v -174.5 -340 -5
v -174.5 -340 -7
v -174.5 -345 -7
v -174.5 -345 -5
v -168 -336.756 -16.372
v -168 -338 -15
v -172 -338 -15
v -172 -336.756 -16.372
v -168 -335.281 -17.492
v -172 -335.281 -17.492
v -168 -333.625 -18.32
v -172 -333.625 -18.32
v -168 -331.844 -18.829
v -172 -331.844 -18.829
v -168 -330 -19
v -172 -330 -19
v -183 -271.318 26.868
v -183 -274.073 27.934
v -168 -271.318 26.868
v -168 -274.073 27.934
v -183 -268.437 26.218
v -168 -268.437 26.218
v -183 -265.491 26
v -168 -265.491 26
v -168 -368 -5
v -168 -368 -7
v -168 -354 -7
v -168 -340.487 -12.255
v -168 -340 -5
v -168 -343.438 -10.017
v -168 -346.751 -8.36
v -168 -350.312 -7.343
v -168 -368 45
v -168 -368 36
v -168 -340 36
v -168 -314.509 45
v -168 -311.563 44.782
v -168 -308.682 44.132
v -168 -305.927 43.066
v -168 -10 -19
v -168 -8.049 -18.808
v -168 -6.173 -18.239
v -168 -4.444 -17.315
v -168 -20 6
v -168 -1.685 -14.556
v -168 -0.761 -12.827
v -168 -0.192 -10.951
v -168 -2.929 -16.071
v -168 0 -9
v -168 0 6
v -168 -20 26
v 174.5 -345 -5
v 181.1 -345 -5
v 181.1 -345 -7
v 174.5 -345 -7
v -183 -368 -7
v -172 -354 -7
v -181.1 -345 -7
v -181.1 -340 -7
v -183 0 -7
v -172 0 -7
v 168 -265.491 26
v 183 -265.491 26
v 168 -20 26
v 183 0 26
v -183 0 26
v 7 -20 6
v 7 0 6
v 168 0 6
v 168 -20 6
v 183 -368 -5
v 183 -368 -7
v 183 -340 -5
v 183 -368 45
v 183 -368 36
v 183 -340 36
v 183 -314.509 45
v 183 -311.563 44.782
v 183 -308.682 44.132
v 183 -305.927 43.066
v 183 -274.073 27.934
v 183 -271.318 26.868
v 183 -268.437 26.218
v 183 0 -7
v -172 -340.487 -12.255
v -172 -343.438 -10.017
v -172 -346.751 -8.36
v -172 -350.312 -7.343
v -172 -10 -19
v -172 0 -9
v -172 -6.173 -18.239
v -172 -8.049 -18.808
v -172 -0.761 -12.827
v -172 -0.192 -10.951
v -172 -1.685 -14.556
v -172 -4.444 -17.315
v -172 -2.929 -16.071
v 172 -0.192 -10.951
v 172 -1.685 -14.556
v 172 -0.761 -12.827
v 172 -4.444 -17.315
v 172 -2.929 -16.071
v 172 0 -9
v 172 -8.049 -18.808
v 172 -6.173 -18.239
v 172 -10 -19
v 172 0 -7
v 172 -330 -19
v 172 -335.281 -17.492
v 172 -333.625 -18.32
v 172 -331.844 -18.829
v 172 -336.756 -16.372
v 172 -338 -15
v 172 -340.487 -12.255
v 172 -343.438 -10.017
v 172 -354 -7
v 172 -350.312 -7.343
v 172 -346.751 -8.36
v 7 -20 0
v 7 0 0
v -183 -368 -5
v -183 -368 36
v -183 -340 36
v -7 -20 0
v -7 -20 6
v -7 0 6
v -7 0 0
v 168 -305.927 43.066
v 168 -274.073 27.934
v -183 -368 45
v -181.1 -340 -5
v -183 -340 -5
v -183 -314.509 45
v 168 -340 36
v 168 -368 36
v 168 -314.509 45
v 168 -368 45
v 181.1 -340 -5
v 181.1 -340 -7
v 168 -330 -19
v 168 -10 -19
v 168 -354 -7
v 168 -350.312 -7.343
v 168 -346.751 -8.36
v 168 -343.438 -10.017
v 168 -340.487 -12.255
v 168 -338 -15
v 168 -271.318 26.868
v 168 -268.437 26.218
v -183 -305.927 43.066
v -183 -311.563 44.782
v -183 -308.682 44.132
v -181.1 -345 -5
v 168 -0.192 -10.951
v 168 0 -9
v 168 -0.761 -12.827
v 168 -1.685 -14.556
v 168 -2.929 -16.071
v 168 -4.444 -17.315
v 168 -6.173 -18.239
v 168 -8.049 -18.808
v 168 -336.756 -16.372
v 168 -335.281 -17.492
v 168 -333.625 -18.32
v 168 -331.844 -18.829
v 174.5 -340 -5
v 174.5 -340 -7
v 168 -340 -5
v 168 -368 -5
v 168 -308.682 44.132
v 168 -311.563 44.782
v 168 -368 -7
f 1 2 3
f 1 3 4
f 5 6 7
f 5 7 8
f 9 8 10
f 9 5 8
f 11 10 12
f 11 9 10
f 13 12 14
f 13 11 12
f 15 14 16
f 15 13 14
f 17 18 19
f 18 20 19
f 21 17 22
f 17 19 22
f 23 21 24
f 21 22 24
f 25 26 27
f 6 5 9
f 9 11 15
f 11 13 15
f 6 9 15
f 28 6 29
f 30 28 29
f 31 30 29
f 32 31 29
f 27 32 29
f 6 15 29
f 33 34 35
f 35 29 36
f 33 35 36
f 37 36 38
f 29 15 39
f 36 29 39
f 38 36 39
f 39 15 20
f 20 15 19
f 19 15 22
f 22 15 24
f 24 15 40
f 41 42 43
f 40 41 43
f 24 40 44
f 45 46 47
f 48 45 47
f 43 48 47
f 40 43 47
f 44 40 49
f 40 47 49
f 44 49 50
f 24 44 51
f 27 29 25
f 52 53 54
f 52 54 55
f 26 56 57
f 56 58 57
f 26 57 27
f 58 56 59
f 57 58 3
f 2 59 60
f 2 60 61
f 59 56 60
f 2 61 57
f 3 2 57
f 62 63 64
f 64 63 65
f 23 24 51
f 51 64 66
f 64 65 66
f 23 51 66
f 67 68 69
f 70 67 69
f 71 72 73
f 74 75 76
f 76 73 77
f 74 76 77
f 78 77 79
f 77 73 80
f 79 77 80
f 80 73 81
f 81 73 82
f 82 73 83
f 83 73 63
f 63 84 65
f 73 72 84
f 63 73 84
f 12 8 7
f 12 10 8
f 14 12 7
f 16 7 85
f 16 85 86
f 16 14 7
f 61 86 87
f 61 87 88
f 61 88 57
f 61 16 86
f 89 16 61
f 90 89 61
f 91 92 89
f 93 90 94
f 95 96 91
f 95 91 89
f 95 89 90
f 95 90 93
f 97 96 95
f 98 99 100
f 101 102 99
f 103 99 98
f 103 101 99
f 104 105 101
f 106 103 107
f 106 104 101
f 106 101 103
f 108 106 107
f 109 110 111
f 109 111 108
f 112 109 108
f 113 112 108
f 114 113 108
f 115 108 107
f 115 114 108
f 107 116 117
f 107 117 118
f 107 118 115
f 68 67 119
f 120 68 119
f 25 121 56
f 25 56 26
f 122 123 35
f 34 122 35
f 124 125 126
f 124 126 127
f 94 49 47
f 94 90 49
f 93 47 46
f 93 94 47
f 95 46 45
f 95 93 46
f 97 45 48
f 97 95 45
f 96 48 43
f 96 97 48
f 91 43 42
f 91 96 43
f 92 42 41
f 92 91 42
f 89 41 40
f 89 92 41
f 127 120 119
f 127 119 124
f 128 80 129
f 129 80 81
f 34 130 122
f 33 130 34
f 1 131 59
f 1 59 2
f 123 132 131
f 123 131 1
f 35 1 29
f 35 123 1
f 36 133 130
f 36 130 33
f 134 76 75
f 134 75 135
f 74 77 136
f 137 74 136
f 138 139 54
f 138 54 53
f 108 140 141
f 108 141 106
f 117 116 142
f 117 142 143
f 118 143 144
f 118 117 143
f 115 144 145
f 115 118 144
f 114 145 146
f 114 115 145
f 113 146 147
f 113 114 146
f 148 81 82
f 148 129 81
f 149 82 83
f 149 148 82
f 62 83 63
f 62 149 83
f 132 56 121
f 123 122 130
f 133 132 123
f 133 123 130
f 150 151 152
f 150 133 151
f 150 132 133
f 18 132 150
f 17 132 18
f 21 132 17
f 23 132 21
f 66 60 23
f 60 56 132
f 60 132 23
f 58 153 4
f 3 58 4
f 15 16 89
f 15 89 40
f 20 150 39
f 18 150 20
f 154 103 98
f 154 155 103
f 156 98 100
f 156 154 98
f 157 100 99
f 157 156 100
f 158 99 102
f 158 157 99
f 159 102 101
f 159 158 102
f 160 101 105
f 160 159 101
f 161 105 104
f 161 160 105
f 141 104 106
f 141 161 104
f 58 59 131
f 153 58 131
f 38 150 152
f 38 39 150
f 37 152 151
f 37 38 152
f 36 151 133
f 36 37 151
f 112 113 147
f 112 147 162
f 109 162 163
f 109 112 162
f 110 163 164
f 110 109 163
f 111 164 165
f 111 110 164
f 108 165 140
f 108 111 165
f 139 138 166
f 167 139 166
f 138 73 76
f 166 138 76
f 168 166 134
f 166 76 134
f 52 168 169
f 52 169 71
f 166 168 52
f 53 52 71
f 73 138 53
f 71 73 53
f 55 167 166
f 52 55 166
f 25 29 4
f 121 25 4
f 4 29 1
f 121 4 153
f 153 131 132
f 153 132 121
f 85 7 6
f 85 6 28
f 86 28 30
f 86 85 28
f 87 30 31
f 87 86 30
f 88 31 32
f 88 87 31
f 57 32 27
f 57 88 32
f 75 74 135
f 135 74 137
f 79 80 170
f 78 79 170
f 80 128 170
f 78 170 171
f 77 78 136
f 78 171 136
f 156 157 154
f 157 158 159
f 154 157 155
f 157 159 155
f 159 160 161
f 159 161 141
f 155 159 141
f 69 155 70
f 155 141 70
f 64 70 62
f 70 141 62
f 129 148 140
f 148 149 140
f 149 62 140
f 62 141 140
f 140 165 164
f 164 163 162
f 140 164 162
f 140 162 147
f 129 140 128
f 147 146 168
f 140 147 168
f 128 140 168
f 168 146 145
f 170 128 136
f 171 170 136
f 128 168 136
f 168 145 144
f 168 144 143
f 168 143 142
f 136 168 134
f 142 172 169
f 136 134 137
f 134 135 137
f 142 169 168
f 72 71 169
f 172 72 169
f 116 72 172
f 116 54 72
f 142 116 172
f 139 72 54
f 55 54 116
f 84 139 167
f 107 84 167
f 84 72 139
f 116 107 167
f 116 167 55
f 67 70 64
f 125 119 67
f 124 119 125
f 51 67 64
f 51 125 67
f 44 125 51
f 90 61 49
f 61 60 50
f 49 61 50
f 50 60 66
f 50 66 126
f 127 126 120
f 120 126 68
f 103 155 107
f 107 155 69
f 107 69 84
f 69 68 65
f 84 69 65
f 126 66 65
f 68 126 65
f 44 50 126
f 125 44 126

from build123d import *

# Parameters (mm, degrees)
EXTRUDE_1_DEPTH        = 26
EXTRUDE_2_DEPTH        = 19
FILLET_1_R             = 10
SKETCH_5_W             = 161
SKETCH_5_H             = 6
CUT_EXTRUDE_1_DEPTH    = 52
SKETCH_1_5_W           = 11
SKETCH_1_5_H           = 340
EXTRUDE_4_DEPTH        = 7
SKETCH_6_W             = 1.9
SKETCH_6_H             = 2
SKETCH_6_W_2           = 6.6
EXTRUDE_5_DEPTH        = 28
SKETCH_6_3_W           = 6.6
SKETCH_6_3_H           = 2
CUT_EXTRUDE_2_DEPTH    = 5
FILLET_2_R             = 20
SKETCH_6_4_W           = 15
SKETCH_6_4_H           = 10
SKETCH_6_4_H_2         = 9
EXTRUDE_6_DEPTH        = 30
SKETCH_6_5_W           = 15
SKETCH_6_5_H           = 9
EXTRUDE_7_DEPTH        = 28
EXTRUDE_8_DEPTH        = 15
FILLET_3_R             = 20
FILLET_3_OF_MIRROR_2_R = 20
FILLET_4_R             = 20


with BuildPart() as part:
    # 스케치1 → 보스-돌출1 (new body)
    with BuildSketch(Plane.XY):
        Polygon((-168, 0), (168, 0), (183, 0), (183, -340), (168, -340), (168, -20), (-168, -20), (-168, -340), (-183, -340), (-183, 0), align=None)
    extrude(amount=EXTRUDE_1_DEPTH)

    # 스케치1<4> → 보스-돌출2 (add)
    with BuildSketch(Plane.XY):
        Polygon((172, 0), (168, 0), (168, -20), (168, -340), (172, -340), align=None)
        Polygon((-168, -20), (-168, 0), (-172, 0), (-172, -340), (-168, -340), align=None)
    extrude(amount=-EXTRUDE_2_DEPTH)

    # 필렛1
    fillet_1_edges = [part.edges().sort_by_distance(p)[0] for p in [
        (170, 0, -19),
        (170, -340, -19),
        (-170, -340, -19),
        (-170, 0, -19),
    ]]
    fillet(fillet_1_edges, radius=FILLET_1_R)

    # 스케치5 → 컷-돌출1 (cut)
    with BuildSketch(Plane(origin=(0, 0, 0), x_dir=(1, 0, 0), z_dir=(0, 1, 0))):
        with Locations((-87.5, -3)):
            Rectangle(SKETCH_5_W, SKETCH_5_H)
        with Locations((87.5, -3)):
            Rectangle(SKETCH_5_W, SKETCH_5_H)
    extrude(amount=-CUT_EXTRUDE_1_DEPTH, mode=Mode.SUBTRACT)

    # 스케치1<5> → 보스-돌출4 (add)
    with BuildSketch(Plane.XY):
        with Locations((177.5, -170)):
            Rectangle(SKETCH_1_5_W, SKETCH_1_5_H)
        with Locations((-177.5, -170)):
            Rectangle(SKETCH_1_5_W, SKETCH_1_5_H)
    extrude(amount=-EXTRUDE_4_DEPTH)

    # 스케치6 → 보스-돌출5 (add)
    with BuildSketch(Plane.XZ.offset(340)):
        with Locations((-182.05, -6)):
            Rectangle(SKETCH_6_W, SKETCH_6_H)
        with Locations((-177.8, -6)):
            Rectangle(SKETCH_6_W_2, SKETCH_6_H)
        Polygon((-174.5, -7), (-172, -7), (-168, -7), (-168, -5), (-174.5, -5), align=None)
    extrude_5 = extrude(amount=EXTRUDE_5_DEPTH)

    # 스케치6<3> → 컷-돌출2 (cut)
    with BuildSketch(Plane.XZ.offset(340)):
        with Locations((-177.8, -6)):
            Rectangle(SKETCH_6_3_W, SKETCH_6_3_H)
    cut_extrude_2 = extrude(amount=CUT_EXTRUDE_2_DEPTH, mode=Mode.SUBTRACT)

    # 필렛2
    # the kernel refuses this fillet: 20 mm, written as the material it adds along each edge
    with BuildSketch(Plane(origin=(-172, -340, -7), x_dir=(0, -1, 0), z_dir=(1, 0, 0))) as fillet_2_piece_1:
        with BuildLine():
            CenterArc((14, 20), FILLET_2_R, 216.869897646, 53.130102354)
            Line((-2, 8), (-3.6, 6.8))
            ThreePointArc((-3.6, 6.8), (-2, 2), (-2, 0))
            Line((-2, 0), (0, -2))
            Line((0, -2), (14, -2))
            Line((14, -2), (14, 0))
        make_face()
    extrude(amount=4)

    # 스케치6<4> → 보스-돌출6 (add)
    with BuildSketch(Plane.XZ.offset(340)):
        with Locations((-175.5, 31)):
            Rectangle(SKETCH_6_4_W, SKETCH_6_4_H)
        with Locations((-175.5, 40.5)):
            Rectangle(SKETCH_6_4_W, SKETCH_6_4_H_2)
    extrude_6 = extrude(amount=-EXTRUDE_6_DEPTH)

    # 스케치6<5> → 보스-돌출7 (add)
    with BuildSketch(Plane.XZ.offset(340)):
        with Locations((-175.5, 40.5)):
            Rectangle(SKETCH_6_5_W, SKETCH_6_5_H)
    extrude_7 = extrude(amount=EXTRUDE_7_DEPTH)

    # 스케치9 → 보스-돌출8 (add)
    with BuildSketch(Plane.ZY.offset(183)):
        Polygon((26, -310), (45, -310), (26, -270), align=None)
    extrude_8 = extrude(amount=-EXTRUDE_8_DEPTH)

    # 필렛3
    fillet_3_edges = [part.edges().sort_by_distance(p)[0] for p in [
        (-175.5, -310, 45),
        (-175.5, -270, 26),
    ]]
    fillet(fillet_3_edges, radius=FILLET_3_R)

    # 대칭 복사2: 보스-돌출5, 컷-돌출2, 보스-돌출6, 보스-돌출7, 보스-돌출8 across plane
    add(extrude_5.mirror(Plane(origin=(0, 0, 0), x_dir=(0, 0, 1), z_dir=(1, 0, 0))))
    add(cut_extrude_2.mirror(Plane(origin=(0, 0, 0), x_dir=(0, 0, 1), z_dir=(1, 0, 0))), mode=Mode.SUBTRACT)
    add(extrude_6.mirror(Plane(origin=(0, 0, 0), x_dir=(0, 0, 1), z_dir=(1, 0, 0))))
    add(extrude_7.mirror(Plane(origin=(0, 0, 0), x_dir=(0, 0, 1), z_dir=(1, 0, 0))))
    add(extrude_8.mirror(Plane(origin=(0, 0, 0), x_dir=(0, 0, 1), z_dir=(1, 0, 0))))

    # 필렛3 of 대칭 복사2
    fillet_3_of_mirror_2_edges = [part.edges().sort_by_distance(p)[0] for p in [
        (175.5, -310, 45),
        (175.5, -270, 26),
    ]]
    fillet(fillet_3_of_mirror_2_edges, radius=FILLET_3_OF_MIRROR_2_R)

    # 필렛4
    # the kernel refuses this fillet: 20 mm, written as the material it adds along each edge
    with BuildSketch(Plane(origin=(172, -340, -7), x_dir=(0, 0.24253562503633938, -0.9701425001453302), z_dir=(-1, 0, 0))) as fillet_4_piece_1:
        with BuildLine():
            CenterArc((16.007351252, 18.432707503), FILLET_4_R, 194.036243468, 53.130102354)
            Line((-3.395498751, 13.581995002), (-5.335783751, 13.096923752))
            Line((-5.335783751, 13.096923752), (-1.940285, -0.48507125))
            Line((-1.940285, -0.48507125), (0.48507125, -1.940285))
            ThreePointArc((0.48507125, -1.940285), (2.42535625, -1.45521375), (7.470097251, -1.84327075))
            Line((7.470097251, -1.84327075), (8.246211251, 0))
        make_face()
    extrude(amount=4)


solid = part.part
